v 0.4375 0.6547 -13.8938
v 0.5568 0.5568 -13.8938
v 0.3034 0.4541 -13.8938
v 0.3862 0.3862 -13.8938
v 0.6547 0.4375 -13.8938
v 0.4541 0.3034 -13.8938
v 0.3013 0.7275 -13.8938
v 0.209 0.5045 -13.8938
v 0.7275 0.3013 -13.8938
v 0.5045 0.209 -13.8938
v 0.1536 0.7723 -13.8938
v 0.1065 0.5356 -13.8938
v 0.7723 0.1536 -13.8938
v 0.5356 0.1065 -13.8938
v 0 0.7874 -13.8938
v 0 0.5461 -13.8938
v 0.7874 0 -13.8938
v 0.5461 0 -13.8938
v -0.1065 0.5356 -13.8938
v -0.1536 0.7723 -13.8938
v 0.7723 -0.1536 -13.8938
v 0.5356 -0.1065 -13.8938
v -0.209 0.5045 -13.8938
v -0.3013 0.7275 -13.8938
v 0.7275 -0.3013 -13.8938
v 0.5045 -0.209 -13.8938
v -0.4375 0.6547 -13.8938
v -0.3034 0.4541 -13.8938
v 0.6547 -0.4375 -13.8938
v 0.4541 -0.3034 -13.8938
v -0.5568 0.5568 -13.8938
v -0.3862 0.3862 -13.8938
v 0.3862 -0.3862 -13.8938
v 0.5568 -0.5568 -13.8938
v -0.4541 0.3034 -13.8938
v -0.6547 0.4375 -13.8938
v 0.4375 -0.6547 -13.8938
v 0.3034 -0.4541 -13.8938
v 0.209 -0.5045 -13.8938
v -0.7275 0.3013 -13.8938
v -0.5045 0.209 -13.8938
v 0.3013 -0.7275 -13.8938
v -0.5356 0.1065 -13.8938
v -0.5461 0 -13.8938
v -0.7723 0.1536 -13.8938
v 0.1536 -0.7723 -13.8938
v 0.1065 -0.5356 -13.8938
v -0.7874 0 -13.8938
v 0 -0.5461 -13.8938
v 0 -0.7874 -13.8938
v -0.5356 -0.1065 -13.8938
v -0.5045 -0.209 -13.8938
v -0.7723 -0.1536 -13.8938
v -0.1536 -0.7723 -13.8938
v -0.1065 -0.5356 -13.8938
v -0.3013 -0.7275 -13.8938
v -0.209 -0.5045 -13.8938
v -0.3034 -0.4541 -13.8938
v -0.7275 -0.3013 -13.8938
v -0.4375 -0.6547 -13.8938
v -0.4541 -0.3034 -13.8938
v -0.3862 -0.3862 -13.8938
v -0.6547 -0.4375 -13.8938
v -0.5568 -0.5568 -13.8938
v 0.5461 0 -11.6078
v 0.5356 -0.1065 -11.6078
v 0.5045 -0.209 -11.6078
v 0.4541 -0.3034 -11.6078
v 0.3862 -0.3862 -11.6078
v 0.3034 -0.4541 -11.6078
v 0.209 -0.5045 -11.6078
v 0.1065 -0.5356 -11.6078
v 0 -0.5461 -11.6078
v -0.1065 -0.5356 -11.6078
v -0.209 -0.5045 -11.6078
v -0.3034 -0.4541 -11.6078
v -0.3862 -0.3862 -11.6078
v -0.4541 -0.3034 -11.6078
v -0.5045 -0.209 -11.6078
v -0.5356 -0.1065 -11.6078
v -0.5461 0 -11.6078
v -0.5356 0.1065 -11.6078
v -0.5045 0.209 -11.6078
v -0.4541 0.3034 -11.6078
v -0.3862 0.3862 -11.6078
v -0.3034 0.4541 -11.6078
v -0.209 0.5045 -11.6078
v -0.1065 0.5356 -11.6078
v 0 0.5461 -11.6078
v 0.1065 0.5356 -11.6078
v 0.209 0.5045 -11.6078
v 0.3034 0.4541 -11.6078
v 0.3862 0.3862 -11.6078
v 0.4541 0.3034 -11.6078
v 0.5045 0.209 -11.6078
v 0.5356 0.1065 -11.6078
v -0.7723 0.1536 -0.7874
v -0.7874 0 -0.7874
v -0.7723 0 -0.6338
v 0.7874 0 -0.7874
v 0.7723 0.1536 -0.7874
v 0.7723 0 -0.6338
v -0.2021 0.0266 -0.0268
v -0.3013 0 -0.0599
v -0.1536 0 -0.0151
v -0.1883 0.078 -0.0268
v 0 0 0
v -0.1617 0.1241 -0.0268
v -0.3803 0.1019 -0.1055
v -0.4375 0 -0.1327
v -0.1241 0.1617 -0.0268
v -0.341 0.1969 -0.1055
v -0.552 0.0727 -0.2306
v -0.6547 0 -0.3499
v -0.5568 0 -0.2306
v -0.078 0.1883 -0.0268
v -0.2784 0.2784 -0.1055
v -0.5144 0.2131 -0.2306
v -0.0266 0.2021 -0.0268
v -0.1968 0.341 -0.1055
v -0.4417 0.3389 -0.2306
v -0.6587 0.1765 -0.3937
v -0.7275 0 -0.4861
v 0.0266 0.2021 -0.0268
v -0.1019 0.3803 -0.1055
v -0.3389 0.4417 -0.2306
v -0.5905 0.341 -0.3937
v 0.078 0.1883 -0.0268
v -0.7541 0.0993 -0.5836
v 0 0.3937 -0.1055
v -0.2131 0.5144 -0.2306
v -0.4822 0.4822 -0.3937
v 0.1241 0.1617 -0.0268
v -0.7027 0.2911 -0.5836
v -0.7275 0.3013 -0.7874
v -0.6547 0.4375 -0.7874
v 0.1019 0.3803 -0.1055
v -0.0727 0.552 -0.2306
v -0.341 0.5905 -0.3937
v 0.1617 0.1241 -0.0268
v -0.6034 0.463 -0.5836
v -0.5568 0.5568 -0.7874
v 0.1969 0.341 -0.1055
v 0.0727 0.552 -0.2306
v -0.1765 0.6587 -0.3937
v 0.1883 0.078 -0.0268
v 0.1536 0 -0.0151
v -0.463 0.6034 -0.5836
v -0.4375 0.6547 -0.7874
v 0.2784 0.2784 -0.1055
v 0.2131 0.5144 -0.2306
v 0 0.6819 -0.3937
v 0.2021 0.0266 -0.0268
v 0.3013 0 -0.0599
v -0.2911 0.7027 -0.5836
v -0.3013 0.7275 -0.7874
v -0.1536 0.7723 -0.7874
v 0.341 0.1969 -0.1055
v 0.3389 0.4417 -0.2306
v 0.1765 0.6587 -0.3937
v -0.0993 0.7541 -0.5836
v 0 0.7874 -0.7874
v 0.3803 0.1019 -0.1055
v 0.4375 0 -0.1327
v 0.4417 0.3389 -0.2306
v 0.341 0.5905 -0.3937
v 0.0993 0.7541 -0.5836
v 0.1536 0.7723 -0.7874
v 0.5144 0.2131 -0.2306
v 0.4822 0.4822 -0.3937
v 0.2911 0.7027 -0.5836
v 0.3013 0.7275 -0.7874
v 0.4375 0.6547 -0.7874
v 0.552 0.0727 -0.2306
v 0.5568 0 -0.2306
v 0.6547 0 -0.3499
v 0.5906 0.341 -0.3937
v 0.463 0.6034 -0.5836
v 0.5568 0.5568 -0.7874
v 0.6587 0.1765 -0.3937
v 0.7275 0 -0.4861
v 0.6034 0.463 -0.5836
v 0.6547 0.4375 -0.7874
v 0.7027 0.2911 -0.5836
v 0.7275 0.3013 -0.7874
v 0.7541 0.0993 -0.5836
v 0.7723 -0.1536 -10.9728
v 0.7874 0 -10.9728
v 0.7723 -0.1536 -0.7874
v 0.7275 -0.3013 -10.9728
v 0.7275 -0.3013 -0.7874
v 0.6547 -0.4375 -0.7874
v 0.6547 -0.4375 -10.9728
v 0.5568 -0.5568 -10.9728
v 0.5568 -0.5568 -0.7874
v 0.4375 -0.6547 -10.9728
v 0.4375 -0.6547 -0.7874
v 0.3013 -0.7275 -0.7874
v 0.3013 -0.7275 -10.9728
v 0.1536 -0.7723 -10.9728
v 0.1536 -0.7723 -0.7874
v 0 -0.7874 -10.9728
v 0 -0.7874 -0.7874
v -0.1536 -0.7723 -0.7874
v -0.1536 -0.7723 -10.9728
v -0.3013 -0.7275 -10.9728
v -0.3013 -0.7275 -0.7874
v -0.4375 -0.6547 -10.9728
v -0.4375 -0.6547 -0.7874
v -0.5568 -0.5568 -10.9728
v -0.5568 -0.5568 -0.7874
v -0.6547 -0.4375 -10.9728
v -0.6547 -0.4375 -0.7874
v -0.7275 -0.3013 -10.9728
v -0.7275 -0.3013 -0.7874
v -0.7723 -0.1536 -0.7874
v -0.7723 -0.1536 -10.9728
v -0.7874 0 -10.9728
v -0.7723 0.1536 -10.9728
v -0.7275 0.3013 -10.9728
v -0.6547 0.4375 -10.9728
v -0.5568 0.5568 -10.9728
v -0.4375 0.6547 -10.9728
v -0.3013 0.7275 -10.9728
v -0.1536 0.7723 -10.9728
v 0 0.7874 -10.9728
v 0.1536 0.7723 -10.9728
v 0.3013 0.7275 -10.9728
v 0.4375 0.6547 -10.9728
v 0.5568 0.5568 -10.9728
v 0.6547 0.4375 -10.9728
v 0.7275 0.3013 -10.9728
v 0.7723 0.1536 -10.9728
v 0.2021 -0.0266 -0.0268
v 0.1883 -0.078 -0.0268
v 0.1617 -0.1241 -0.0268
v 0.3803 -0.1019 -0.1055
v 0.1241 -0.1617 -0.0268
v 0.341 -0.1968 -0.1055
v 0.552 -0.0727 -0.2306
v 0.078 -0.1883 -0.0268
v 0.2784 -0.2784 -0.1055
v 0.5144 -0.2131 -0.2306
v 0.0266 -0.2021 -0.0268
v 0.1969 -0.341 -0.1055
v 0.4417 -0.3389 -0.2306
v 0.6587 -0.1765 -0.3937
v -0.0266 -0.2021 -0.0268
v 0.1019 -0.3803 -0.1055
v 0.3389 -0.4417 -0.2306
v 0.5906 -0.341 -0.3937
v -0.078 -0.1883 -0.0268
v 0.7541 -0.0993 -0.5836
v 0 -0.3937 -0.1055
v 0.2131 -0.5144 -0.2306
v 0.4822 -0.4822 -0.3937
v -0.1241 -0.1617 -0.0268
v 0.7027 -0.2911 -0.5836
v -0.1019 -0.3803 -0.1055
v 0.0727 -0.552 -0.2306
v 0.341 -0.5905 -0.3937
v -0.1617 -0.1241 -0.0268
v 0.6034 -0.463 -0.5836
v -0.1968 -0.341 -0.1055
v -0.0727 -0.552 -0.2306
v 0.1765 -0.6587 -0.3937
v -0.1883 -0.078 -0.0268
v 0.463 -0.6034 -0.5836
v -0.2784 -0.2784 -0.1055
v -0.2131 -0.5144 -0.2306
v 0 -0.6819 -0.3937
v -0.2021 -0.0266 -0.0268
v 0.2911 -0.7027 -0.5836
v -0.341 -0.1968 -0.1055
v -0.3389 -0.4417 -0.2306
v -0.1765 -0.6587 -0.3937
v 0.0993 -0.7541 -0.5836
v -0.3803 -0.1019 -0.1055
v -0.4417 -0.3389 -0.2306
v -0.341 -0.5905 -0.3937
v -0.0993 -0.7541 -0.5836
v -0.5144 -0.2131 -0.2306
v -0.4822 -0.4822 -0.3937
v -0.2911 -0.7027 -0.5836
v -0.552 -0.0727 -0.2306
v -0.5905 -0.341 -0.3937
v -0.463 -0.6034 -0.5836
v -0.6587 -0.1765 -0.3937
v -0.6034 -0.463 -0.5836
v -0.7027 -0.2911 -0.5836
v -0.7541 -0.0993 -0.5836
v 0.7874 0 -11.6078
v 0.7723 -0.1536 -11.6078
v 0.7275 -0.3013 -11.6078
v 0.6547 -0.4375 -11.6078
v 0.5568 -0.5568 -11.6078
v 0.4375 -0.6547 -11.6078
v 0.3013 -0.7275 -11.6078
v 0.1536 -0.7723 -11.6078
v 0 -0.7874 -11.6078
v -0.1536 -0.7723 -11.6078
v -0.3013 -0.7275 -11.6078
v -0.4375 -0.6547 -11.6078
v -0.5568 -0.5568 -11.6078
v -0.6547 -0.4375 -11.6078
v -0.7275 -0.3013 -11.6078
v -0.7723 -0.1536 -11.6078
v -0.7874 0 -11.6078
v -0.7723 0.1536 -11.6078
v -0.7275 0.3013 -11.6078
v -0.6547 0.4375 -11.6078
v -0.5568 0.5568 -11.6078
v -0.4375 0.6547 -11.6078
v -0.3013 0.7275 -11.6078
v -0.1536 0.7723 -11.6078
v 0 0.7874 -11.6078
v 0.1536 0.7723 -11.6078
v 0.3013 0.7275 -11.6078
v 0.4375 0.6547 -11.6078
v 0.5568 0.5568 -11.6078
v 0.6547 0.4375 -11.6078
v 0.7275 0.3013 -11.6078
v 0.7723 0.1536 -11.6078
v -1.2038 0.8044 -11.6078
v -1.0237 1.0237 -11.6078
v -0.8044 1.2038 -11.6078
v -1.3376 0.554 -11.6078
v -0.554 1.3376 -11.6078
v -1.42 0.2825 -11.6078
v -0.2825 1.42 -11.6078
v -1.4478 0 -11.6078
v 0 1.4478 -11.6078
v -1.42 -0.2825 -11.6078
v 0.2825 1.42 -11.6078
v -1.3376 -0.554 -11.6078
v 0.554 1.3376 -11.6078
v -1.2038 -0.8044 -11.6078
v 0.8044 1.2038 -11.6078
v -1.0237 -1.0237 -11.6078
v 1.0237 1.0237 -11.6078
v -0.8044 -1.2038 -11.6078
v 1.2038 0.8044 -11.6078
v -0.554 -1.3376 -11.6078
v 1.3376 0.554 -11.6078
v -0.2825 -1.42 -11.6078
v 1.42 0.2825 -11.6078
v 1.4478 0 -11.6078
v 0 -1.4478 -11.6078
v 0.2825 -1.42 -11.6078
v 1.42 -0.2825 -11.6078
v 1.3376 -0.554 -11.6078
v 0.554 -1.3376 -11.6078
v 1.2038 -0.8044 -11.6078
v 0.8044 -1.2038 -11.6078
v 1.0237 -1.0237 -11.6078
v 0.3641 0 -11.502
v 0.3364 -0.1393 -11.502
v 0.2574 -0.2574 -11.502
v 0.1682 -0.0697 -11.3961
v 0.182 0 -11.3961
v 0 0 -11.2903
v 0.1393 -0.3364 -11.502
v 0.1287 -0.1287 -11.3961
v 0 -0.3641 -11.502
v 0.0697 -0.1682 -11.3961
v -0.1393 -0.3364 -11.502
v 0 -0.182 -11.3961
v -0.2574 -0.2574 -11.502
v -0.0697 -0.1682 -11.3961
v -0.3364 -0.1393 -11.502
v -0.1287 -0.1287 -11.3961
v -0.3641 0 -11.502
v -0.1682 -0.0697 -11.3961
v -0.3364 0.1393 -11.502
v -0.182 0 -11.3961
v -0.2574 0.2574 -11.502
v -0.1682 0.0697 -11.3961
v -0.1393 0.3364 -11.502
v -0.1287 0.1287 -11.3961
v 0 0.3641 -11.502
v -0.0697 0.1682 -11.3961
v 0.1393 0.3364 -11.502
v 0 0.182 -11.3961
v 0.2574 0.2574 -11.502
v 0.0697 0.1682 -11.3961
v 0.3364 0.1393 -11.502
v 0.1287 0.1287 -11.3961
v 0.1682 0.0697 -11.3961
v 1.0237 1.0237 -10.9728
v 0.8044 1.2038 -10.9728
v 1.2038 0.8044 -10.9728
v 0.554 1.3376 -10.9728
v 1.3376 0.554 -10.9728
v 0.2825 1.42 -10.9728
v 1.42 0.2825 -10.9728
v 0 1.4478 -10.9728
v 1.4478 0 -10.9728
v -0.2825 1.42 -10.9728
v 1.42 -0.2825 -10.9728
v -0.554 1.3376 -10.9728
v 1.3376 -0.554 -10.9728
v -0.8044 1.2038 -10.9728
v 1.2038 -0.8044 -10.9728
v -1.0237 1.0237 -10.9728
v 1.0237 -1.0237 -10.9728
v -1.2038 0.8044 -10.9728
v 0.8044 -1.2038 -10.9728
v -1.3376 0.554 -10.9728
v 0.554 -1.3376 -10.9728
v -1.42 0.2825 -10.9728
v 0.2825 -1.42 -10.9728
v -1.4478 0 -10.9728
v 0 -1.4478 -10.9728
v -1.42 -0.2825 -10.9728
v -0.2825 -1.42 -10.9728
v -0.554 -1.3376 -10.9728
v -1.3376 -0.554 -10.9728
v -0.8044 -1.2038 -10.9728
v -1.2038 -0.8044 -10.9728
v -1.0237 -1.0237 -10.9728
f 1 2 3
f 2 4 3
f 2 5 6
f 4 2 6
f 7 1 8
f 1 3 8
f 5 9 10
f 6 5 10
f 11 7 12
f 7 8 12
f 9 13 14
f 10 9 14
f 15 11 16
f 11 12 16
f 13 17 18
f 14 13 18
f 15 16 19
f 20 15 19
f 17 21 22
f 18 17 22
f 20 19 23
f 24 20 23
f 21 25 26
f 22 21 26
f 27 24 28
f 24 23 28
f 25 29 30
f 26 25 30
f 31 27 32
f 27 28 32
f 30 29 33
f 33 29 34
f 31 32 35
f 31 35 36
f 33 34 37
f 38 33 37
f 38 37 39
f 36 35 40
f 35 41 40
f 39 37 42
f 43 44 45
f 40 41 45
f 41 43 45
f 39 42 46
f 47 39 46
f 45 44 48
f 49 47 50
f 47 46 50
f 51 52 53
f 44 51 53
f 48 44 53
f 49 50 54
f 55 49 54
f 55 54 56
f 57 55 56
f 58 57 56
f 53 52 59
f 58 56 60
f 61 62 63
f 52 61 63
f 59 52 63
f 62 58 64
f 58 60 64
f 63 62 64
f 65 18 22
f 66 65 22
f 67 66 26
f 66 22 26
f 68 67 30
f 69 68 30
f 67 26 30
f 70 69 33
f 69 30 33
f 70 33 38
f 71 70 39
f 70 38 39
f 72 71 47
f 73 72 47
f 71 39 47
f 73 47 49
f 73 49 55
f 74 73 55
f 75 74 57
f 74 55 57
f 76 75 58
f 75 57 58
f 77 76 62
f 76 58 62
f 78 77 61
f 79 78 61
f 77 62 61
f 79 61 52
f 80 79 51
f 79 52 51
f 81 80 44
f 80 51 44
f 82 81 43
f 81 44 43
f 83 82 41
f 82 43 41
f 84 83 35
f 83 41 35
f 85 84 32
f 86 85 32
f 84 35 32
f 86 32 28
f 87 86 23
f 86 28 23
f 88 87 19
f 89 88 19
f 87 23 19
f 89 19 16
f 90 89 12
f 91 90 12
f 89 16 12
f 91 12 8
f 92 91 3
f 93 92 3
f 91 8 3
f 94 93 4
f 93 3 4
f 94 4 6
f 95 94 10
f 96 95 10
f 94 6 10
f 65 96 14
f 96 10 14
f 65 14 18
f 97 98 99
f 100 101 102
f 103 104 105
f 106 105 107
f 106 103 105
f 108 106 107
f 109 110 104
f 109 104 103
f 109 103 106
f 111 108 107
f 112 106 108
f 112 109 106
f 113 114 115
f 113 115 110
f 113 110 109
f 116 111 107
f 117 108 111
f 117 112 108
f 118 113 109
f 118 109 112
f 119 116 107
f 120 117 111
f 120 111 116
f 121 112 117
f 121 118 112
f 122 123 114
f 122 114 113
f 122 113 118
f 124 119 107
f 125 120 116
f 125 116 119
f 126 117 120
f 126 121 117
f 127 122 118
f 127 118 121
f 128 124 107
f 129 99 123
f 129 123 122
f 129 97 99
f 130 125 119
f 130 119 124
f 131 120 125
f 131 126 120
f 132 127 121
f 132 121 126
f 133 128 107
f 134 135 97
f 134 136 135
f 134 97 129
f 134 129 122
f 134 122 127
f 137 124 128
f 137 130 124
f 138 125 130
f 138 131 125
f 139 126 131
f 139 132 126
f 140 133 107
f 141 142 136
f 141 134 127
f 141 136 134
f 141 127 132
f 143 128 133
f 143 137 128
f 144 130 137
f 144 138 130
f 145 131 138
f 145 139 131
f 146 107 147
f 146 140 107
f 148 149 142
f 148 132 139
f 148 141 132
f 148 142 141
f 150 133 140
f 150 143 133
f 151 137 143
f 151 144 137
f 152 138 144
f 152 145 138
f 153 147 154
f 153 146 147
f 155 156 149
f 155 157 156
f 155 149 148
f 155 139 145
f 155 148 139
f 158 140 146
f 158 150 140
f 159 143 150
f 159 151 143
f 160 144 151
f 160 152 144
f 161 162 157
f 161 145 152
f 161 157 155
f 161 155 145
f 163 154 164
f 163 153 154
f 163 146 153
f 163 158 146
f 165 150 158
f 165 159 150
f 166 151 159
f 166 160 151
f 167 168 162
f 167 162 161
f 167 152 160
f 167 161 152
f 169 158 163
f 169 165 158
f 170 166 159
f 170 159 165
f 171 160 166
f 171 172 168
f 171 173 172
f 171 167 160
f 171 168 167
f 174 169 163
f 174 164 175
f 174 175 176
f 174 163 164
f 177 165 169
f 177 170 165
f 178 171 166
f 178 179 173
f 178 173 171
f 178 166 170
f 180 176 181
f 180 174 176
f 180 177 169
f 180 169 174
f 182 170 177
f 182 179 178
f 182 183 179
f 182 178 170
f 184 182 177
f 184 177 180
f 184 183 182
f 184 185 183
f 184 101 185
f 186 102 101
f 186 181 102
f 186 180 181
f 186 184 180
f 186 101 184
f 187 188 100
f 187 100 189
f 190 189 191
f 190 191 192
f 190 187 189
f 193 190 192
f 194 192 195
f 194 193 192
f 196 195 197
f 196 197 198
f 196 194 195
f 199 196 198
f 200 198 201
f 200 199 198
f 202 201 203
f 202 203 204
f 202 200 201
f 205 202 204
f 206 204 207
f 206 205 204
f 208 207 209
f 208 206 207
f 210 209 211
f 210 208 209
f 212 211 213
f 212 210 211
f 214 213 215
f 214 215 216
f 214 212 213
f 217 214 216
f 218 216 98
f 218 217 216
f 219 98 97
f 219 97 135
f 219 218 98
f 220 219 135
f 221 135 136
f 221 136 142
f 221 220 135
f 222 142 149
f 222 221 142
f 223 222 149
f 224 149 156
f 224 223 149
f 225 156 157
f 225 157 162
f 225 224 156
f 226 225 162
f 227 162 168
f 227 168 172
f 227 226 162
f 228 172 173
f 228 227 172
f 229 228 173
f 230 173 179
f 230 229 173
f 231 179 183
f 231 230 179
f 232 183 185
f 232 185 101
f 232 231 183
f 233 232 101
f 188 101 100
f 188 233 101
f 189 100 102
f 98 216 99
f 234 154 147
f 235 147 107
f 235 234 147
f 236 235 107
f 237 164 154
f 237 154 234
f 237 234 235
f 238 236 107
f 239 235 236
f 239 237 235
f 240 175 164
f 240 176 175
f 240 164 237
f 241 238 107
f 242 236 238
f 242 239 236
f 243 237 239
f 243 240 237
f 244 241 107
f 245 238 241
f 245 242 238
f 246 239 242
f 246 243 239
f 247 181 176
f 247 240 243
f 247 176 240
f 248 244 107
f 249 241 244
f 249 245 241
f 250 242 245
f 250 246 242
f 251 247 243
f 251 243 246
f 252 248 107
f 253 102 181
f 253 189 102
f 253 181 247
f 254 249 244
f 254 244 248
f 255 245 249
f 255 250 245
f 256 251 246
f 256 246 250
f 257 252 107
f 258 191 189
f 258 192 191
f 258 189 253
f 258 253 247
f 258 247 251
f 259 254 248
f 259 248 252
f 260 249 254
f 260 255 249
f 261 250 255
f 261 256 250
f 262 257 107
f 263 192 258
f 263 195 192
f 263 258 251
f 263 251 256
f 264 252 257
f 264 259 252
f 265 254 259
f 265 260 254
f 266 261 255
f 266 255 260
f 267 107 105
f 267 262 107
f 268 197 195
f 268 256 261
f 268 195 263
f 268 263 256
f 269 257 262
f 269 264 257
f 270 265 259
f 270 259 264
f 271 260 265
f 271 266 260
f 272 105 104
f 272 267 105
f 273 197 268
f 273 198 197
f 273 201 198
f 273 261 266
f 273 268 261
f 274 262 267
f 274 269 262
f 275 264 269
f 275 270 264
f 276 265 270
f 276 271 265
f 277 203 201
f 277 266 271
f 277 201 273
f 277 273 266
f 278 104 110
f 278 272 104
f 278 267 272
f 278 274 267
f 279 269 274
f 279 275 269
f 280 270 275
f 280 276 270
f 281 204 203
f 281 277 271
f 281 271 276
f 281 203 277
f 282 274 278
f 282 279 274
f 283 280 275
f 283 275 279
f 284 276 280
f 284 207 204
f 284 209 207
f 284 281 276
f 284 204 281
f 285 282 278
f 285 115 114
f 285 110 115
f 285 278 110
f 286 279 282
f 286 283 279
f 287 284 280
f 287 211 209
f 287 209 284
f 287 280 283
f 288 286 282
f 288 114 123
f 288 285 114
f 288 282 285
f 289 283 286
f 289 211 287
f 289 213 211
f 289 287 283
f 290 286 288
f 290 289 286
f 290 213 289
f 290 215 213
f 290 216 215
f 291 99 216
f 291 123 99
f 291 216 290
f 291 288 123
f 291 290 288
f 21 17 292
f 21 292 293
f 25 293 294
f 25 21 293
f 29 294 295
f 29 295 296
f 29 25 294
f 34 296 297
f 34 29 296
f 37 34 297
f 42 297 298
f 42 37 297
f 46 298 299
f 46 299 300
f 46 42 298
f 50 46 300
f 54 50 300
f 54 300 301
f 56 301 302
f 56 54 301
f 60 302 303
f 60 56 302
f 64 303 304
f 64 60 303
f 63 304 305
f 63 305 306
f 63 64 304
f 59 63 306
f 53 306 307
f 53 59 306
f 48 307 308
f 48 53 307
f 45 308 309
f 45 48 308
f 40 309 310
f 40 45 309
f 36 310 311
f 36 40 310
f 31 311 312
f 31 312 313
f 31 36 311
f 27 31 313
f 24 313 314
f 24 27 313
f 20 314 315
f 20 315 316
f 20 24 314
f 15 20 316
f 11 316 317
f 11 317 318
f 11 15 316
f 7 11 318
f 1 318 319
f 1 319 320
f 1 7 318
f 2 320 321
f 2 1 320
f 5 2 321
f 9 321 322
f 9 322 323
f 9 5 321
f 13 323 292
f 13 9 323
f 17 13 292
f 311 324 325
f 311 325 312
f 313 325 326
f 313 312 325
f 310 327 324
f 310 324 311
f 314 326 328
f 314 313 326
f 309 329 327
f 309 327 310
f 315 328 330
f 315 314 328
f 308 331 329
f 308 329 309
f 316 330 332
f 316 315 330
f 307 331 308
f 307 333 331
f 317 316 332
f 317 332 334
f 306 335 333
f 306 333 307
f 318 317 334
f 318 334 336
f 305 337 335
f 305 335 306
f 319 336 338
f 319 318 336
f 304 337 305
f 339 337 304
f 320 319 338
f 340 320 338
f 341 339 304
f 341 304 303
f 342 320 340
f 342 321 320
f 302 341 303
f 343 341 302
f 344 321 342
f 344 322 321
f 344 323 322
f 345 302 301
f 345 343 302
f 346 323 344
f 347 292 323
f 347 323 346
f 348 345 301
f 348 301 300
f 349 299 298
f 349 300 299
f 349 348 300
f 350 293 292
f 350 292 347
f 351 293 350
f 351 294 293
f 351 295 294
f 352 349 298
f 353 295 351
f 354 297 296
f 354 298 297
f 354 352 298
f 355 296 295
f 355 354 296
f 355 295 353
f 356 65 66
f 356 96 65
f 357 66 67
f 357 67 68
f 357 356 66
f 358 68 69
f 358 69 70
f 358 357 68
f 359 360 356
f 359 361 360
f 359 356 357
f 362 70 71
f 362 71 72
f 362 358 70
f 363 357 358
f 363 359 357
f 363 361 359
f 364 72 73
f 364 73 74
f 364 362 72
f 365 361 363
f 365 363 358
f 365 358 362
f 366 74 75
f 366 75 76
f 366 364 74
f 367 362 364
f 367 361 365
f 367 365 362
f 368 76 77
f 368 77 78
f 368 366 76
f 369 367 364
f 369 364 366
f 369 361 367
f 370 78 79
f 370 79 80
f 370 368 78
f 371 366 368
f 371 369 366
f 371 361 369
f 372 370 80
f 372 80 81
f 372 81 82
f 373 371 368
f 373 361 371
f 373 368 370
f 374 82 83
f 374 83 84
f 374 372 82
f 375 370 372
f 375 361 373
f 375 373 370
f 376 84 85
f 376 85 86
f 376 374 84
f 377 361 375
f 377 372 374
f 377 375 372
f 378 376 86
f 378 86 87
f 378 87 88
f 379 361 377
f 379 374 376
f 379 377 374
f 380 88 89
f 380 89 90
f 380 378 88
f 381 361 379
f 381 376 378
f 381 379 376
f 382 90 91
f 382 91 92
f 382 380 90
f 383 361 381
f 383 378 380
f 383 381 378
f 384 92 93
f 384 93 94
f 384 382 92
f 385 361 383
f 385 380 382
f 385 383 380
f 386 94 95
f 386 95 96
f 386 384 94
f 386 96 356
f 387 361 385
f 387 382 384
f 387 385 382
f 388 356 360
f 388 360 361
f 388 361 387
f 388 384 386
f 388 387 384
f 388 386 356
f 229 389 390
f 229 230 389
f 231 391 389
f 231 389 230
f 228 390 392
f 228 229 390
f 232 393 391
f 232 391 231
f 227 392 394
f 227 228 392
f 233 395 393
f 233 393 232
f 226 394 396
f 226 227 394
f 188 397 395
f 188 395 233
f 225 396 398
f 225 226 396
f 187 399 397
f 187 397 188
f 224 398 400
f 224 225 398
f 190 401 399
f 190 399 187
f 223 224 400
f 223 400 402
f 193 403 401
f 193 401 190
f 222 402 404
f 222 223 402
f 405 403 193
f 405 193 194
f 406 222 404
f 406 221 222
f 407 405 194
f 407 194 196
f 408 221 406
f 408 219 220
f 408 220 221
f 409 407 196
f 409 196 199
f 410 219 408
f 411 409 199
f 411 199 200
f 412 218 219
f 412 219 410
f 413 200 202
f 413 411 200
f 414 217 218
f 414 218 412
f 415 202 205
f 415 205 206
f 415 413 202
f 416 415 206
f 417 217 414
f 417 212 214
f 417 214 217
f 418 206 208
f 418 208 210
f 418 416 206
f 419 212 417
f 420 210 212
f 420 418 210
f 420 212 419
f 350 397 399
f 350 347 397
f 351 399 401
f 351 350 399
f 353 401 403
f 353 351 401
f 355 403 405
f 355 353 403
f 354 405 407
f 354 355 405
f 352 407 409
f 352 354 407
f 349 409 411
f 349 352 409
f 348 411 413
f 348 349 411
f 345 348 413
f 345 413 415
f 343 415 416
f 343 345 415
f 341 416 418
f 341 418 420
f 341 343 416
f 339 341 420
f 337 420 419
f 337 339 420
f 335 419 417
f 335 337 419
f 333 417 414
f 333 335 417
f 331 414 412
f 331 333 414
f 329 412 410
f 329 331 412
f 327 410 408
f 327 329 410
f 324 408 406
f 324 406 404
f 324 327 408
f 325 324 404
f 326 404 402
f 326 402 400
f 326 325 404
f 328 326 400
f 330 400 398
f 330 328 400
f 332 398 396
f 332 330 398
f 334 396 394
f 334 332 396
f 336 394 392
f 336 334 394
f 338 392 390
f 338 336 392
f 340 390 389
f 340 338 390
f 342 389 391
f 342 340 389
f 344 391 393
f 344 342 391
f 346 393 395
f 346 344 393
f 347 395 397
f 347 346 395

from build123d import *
from build123d.topology import SkipClean

# Parameters (mm, degrees)
SKETCH1_W = 0.2413
SKETCH1_H = 2.286


with BuildPart() as part:
    # Sketch1 → Revolve1 (revolve)
    with SkipClean():  # the faces are left unmerged after this step: merging them gives an invalid solid
        with BuildSketch(Plane(origin=(0, 0, 0), x_dir=(1, 0, 0), z_dir=(0, 1, 0))):
            with BuildLine():
                ThreePointArc((0.7874, 0.7874), (0.55677588, 1.34417588), (0, 1.5748))
                Line((0, 1.5748), (0, 0))
                ThreePointArc((0, 0), (0.55677588, 0.23062412), (0.7874, 0.7874))
            make_face()
            with BuildLine():
                Line((0, 0), (0, 1.5748))
                ThreePointArc((0, 1.5748), (-0.7874, 0.7874), (0, 0))
            make_face()
            with BuildLine():
                Line((0.7874, 10.9728), (0, 10.9728))
                Line((0, 10.9728), (0, 1.5748))
                ThreePointArc((0, 1.5748), (0.55677588, 1.34417588), (0.7874, 0.7874))
                Line((0.7874, 0.7874), (0.7874, 10.9728))
            make_face()
            Polygon((0.7874, 11.6078), (0.5461, 11.6078), (0, 11.2903), (0, 10.9728), (0.7874, 10.9728), (1.4478, 10.9728), (1.4478, 11.6078), align=None)
            with Locations((0.66675, 12.7508)):
                Rectangle(SKETCH1_W, SKETCH1_H)
        revolve(axis=Axis((0, 0, 0), (0, 0, -1)))


solid = part.part
